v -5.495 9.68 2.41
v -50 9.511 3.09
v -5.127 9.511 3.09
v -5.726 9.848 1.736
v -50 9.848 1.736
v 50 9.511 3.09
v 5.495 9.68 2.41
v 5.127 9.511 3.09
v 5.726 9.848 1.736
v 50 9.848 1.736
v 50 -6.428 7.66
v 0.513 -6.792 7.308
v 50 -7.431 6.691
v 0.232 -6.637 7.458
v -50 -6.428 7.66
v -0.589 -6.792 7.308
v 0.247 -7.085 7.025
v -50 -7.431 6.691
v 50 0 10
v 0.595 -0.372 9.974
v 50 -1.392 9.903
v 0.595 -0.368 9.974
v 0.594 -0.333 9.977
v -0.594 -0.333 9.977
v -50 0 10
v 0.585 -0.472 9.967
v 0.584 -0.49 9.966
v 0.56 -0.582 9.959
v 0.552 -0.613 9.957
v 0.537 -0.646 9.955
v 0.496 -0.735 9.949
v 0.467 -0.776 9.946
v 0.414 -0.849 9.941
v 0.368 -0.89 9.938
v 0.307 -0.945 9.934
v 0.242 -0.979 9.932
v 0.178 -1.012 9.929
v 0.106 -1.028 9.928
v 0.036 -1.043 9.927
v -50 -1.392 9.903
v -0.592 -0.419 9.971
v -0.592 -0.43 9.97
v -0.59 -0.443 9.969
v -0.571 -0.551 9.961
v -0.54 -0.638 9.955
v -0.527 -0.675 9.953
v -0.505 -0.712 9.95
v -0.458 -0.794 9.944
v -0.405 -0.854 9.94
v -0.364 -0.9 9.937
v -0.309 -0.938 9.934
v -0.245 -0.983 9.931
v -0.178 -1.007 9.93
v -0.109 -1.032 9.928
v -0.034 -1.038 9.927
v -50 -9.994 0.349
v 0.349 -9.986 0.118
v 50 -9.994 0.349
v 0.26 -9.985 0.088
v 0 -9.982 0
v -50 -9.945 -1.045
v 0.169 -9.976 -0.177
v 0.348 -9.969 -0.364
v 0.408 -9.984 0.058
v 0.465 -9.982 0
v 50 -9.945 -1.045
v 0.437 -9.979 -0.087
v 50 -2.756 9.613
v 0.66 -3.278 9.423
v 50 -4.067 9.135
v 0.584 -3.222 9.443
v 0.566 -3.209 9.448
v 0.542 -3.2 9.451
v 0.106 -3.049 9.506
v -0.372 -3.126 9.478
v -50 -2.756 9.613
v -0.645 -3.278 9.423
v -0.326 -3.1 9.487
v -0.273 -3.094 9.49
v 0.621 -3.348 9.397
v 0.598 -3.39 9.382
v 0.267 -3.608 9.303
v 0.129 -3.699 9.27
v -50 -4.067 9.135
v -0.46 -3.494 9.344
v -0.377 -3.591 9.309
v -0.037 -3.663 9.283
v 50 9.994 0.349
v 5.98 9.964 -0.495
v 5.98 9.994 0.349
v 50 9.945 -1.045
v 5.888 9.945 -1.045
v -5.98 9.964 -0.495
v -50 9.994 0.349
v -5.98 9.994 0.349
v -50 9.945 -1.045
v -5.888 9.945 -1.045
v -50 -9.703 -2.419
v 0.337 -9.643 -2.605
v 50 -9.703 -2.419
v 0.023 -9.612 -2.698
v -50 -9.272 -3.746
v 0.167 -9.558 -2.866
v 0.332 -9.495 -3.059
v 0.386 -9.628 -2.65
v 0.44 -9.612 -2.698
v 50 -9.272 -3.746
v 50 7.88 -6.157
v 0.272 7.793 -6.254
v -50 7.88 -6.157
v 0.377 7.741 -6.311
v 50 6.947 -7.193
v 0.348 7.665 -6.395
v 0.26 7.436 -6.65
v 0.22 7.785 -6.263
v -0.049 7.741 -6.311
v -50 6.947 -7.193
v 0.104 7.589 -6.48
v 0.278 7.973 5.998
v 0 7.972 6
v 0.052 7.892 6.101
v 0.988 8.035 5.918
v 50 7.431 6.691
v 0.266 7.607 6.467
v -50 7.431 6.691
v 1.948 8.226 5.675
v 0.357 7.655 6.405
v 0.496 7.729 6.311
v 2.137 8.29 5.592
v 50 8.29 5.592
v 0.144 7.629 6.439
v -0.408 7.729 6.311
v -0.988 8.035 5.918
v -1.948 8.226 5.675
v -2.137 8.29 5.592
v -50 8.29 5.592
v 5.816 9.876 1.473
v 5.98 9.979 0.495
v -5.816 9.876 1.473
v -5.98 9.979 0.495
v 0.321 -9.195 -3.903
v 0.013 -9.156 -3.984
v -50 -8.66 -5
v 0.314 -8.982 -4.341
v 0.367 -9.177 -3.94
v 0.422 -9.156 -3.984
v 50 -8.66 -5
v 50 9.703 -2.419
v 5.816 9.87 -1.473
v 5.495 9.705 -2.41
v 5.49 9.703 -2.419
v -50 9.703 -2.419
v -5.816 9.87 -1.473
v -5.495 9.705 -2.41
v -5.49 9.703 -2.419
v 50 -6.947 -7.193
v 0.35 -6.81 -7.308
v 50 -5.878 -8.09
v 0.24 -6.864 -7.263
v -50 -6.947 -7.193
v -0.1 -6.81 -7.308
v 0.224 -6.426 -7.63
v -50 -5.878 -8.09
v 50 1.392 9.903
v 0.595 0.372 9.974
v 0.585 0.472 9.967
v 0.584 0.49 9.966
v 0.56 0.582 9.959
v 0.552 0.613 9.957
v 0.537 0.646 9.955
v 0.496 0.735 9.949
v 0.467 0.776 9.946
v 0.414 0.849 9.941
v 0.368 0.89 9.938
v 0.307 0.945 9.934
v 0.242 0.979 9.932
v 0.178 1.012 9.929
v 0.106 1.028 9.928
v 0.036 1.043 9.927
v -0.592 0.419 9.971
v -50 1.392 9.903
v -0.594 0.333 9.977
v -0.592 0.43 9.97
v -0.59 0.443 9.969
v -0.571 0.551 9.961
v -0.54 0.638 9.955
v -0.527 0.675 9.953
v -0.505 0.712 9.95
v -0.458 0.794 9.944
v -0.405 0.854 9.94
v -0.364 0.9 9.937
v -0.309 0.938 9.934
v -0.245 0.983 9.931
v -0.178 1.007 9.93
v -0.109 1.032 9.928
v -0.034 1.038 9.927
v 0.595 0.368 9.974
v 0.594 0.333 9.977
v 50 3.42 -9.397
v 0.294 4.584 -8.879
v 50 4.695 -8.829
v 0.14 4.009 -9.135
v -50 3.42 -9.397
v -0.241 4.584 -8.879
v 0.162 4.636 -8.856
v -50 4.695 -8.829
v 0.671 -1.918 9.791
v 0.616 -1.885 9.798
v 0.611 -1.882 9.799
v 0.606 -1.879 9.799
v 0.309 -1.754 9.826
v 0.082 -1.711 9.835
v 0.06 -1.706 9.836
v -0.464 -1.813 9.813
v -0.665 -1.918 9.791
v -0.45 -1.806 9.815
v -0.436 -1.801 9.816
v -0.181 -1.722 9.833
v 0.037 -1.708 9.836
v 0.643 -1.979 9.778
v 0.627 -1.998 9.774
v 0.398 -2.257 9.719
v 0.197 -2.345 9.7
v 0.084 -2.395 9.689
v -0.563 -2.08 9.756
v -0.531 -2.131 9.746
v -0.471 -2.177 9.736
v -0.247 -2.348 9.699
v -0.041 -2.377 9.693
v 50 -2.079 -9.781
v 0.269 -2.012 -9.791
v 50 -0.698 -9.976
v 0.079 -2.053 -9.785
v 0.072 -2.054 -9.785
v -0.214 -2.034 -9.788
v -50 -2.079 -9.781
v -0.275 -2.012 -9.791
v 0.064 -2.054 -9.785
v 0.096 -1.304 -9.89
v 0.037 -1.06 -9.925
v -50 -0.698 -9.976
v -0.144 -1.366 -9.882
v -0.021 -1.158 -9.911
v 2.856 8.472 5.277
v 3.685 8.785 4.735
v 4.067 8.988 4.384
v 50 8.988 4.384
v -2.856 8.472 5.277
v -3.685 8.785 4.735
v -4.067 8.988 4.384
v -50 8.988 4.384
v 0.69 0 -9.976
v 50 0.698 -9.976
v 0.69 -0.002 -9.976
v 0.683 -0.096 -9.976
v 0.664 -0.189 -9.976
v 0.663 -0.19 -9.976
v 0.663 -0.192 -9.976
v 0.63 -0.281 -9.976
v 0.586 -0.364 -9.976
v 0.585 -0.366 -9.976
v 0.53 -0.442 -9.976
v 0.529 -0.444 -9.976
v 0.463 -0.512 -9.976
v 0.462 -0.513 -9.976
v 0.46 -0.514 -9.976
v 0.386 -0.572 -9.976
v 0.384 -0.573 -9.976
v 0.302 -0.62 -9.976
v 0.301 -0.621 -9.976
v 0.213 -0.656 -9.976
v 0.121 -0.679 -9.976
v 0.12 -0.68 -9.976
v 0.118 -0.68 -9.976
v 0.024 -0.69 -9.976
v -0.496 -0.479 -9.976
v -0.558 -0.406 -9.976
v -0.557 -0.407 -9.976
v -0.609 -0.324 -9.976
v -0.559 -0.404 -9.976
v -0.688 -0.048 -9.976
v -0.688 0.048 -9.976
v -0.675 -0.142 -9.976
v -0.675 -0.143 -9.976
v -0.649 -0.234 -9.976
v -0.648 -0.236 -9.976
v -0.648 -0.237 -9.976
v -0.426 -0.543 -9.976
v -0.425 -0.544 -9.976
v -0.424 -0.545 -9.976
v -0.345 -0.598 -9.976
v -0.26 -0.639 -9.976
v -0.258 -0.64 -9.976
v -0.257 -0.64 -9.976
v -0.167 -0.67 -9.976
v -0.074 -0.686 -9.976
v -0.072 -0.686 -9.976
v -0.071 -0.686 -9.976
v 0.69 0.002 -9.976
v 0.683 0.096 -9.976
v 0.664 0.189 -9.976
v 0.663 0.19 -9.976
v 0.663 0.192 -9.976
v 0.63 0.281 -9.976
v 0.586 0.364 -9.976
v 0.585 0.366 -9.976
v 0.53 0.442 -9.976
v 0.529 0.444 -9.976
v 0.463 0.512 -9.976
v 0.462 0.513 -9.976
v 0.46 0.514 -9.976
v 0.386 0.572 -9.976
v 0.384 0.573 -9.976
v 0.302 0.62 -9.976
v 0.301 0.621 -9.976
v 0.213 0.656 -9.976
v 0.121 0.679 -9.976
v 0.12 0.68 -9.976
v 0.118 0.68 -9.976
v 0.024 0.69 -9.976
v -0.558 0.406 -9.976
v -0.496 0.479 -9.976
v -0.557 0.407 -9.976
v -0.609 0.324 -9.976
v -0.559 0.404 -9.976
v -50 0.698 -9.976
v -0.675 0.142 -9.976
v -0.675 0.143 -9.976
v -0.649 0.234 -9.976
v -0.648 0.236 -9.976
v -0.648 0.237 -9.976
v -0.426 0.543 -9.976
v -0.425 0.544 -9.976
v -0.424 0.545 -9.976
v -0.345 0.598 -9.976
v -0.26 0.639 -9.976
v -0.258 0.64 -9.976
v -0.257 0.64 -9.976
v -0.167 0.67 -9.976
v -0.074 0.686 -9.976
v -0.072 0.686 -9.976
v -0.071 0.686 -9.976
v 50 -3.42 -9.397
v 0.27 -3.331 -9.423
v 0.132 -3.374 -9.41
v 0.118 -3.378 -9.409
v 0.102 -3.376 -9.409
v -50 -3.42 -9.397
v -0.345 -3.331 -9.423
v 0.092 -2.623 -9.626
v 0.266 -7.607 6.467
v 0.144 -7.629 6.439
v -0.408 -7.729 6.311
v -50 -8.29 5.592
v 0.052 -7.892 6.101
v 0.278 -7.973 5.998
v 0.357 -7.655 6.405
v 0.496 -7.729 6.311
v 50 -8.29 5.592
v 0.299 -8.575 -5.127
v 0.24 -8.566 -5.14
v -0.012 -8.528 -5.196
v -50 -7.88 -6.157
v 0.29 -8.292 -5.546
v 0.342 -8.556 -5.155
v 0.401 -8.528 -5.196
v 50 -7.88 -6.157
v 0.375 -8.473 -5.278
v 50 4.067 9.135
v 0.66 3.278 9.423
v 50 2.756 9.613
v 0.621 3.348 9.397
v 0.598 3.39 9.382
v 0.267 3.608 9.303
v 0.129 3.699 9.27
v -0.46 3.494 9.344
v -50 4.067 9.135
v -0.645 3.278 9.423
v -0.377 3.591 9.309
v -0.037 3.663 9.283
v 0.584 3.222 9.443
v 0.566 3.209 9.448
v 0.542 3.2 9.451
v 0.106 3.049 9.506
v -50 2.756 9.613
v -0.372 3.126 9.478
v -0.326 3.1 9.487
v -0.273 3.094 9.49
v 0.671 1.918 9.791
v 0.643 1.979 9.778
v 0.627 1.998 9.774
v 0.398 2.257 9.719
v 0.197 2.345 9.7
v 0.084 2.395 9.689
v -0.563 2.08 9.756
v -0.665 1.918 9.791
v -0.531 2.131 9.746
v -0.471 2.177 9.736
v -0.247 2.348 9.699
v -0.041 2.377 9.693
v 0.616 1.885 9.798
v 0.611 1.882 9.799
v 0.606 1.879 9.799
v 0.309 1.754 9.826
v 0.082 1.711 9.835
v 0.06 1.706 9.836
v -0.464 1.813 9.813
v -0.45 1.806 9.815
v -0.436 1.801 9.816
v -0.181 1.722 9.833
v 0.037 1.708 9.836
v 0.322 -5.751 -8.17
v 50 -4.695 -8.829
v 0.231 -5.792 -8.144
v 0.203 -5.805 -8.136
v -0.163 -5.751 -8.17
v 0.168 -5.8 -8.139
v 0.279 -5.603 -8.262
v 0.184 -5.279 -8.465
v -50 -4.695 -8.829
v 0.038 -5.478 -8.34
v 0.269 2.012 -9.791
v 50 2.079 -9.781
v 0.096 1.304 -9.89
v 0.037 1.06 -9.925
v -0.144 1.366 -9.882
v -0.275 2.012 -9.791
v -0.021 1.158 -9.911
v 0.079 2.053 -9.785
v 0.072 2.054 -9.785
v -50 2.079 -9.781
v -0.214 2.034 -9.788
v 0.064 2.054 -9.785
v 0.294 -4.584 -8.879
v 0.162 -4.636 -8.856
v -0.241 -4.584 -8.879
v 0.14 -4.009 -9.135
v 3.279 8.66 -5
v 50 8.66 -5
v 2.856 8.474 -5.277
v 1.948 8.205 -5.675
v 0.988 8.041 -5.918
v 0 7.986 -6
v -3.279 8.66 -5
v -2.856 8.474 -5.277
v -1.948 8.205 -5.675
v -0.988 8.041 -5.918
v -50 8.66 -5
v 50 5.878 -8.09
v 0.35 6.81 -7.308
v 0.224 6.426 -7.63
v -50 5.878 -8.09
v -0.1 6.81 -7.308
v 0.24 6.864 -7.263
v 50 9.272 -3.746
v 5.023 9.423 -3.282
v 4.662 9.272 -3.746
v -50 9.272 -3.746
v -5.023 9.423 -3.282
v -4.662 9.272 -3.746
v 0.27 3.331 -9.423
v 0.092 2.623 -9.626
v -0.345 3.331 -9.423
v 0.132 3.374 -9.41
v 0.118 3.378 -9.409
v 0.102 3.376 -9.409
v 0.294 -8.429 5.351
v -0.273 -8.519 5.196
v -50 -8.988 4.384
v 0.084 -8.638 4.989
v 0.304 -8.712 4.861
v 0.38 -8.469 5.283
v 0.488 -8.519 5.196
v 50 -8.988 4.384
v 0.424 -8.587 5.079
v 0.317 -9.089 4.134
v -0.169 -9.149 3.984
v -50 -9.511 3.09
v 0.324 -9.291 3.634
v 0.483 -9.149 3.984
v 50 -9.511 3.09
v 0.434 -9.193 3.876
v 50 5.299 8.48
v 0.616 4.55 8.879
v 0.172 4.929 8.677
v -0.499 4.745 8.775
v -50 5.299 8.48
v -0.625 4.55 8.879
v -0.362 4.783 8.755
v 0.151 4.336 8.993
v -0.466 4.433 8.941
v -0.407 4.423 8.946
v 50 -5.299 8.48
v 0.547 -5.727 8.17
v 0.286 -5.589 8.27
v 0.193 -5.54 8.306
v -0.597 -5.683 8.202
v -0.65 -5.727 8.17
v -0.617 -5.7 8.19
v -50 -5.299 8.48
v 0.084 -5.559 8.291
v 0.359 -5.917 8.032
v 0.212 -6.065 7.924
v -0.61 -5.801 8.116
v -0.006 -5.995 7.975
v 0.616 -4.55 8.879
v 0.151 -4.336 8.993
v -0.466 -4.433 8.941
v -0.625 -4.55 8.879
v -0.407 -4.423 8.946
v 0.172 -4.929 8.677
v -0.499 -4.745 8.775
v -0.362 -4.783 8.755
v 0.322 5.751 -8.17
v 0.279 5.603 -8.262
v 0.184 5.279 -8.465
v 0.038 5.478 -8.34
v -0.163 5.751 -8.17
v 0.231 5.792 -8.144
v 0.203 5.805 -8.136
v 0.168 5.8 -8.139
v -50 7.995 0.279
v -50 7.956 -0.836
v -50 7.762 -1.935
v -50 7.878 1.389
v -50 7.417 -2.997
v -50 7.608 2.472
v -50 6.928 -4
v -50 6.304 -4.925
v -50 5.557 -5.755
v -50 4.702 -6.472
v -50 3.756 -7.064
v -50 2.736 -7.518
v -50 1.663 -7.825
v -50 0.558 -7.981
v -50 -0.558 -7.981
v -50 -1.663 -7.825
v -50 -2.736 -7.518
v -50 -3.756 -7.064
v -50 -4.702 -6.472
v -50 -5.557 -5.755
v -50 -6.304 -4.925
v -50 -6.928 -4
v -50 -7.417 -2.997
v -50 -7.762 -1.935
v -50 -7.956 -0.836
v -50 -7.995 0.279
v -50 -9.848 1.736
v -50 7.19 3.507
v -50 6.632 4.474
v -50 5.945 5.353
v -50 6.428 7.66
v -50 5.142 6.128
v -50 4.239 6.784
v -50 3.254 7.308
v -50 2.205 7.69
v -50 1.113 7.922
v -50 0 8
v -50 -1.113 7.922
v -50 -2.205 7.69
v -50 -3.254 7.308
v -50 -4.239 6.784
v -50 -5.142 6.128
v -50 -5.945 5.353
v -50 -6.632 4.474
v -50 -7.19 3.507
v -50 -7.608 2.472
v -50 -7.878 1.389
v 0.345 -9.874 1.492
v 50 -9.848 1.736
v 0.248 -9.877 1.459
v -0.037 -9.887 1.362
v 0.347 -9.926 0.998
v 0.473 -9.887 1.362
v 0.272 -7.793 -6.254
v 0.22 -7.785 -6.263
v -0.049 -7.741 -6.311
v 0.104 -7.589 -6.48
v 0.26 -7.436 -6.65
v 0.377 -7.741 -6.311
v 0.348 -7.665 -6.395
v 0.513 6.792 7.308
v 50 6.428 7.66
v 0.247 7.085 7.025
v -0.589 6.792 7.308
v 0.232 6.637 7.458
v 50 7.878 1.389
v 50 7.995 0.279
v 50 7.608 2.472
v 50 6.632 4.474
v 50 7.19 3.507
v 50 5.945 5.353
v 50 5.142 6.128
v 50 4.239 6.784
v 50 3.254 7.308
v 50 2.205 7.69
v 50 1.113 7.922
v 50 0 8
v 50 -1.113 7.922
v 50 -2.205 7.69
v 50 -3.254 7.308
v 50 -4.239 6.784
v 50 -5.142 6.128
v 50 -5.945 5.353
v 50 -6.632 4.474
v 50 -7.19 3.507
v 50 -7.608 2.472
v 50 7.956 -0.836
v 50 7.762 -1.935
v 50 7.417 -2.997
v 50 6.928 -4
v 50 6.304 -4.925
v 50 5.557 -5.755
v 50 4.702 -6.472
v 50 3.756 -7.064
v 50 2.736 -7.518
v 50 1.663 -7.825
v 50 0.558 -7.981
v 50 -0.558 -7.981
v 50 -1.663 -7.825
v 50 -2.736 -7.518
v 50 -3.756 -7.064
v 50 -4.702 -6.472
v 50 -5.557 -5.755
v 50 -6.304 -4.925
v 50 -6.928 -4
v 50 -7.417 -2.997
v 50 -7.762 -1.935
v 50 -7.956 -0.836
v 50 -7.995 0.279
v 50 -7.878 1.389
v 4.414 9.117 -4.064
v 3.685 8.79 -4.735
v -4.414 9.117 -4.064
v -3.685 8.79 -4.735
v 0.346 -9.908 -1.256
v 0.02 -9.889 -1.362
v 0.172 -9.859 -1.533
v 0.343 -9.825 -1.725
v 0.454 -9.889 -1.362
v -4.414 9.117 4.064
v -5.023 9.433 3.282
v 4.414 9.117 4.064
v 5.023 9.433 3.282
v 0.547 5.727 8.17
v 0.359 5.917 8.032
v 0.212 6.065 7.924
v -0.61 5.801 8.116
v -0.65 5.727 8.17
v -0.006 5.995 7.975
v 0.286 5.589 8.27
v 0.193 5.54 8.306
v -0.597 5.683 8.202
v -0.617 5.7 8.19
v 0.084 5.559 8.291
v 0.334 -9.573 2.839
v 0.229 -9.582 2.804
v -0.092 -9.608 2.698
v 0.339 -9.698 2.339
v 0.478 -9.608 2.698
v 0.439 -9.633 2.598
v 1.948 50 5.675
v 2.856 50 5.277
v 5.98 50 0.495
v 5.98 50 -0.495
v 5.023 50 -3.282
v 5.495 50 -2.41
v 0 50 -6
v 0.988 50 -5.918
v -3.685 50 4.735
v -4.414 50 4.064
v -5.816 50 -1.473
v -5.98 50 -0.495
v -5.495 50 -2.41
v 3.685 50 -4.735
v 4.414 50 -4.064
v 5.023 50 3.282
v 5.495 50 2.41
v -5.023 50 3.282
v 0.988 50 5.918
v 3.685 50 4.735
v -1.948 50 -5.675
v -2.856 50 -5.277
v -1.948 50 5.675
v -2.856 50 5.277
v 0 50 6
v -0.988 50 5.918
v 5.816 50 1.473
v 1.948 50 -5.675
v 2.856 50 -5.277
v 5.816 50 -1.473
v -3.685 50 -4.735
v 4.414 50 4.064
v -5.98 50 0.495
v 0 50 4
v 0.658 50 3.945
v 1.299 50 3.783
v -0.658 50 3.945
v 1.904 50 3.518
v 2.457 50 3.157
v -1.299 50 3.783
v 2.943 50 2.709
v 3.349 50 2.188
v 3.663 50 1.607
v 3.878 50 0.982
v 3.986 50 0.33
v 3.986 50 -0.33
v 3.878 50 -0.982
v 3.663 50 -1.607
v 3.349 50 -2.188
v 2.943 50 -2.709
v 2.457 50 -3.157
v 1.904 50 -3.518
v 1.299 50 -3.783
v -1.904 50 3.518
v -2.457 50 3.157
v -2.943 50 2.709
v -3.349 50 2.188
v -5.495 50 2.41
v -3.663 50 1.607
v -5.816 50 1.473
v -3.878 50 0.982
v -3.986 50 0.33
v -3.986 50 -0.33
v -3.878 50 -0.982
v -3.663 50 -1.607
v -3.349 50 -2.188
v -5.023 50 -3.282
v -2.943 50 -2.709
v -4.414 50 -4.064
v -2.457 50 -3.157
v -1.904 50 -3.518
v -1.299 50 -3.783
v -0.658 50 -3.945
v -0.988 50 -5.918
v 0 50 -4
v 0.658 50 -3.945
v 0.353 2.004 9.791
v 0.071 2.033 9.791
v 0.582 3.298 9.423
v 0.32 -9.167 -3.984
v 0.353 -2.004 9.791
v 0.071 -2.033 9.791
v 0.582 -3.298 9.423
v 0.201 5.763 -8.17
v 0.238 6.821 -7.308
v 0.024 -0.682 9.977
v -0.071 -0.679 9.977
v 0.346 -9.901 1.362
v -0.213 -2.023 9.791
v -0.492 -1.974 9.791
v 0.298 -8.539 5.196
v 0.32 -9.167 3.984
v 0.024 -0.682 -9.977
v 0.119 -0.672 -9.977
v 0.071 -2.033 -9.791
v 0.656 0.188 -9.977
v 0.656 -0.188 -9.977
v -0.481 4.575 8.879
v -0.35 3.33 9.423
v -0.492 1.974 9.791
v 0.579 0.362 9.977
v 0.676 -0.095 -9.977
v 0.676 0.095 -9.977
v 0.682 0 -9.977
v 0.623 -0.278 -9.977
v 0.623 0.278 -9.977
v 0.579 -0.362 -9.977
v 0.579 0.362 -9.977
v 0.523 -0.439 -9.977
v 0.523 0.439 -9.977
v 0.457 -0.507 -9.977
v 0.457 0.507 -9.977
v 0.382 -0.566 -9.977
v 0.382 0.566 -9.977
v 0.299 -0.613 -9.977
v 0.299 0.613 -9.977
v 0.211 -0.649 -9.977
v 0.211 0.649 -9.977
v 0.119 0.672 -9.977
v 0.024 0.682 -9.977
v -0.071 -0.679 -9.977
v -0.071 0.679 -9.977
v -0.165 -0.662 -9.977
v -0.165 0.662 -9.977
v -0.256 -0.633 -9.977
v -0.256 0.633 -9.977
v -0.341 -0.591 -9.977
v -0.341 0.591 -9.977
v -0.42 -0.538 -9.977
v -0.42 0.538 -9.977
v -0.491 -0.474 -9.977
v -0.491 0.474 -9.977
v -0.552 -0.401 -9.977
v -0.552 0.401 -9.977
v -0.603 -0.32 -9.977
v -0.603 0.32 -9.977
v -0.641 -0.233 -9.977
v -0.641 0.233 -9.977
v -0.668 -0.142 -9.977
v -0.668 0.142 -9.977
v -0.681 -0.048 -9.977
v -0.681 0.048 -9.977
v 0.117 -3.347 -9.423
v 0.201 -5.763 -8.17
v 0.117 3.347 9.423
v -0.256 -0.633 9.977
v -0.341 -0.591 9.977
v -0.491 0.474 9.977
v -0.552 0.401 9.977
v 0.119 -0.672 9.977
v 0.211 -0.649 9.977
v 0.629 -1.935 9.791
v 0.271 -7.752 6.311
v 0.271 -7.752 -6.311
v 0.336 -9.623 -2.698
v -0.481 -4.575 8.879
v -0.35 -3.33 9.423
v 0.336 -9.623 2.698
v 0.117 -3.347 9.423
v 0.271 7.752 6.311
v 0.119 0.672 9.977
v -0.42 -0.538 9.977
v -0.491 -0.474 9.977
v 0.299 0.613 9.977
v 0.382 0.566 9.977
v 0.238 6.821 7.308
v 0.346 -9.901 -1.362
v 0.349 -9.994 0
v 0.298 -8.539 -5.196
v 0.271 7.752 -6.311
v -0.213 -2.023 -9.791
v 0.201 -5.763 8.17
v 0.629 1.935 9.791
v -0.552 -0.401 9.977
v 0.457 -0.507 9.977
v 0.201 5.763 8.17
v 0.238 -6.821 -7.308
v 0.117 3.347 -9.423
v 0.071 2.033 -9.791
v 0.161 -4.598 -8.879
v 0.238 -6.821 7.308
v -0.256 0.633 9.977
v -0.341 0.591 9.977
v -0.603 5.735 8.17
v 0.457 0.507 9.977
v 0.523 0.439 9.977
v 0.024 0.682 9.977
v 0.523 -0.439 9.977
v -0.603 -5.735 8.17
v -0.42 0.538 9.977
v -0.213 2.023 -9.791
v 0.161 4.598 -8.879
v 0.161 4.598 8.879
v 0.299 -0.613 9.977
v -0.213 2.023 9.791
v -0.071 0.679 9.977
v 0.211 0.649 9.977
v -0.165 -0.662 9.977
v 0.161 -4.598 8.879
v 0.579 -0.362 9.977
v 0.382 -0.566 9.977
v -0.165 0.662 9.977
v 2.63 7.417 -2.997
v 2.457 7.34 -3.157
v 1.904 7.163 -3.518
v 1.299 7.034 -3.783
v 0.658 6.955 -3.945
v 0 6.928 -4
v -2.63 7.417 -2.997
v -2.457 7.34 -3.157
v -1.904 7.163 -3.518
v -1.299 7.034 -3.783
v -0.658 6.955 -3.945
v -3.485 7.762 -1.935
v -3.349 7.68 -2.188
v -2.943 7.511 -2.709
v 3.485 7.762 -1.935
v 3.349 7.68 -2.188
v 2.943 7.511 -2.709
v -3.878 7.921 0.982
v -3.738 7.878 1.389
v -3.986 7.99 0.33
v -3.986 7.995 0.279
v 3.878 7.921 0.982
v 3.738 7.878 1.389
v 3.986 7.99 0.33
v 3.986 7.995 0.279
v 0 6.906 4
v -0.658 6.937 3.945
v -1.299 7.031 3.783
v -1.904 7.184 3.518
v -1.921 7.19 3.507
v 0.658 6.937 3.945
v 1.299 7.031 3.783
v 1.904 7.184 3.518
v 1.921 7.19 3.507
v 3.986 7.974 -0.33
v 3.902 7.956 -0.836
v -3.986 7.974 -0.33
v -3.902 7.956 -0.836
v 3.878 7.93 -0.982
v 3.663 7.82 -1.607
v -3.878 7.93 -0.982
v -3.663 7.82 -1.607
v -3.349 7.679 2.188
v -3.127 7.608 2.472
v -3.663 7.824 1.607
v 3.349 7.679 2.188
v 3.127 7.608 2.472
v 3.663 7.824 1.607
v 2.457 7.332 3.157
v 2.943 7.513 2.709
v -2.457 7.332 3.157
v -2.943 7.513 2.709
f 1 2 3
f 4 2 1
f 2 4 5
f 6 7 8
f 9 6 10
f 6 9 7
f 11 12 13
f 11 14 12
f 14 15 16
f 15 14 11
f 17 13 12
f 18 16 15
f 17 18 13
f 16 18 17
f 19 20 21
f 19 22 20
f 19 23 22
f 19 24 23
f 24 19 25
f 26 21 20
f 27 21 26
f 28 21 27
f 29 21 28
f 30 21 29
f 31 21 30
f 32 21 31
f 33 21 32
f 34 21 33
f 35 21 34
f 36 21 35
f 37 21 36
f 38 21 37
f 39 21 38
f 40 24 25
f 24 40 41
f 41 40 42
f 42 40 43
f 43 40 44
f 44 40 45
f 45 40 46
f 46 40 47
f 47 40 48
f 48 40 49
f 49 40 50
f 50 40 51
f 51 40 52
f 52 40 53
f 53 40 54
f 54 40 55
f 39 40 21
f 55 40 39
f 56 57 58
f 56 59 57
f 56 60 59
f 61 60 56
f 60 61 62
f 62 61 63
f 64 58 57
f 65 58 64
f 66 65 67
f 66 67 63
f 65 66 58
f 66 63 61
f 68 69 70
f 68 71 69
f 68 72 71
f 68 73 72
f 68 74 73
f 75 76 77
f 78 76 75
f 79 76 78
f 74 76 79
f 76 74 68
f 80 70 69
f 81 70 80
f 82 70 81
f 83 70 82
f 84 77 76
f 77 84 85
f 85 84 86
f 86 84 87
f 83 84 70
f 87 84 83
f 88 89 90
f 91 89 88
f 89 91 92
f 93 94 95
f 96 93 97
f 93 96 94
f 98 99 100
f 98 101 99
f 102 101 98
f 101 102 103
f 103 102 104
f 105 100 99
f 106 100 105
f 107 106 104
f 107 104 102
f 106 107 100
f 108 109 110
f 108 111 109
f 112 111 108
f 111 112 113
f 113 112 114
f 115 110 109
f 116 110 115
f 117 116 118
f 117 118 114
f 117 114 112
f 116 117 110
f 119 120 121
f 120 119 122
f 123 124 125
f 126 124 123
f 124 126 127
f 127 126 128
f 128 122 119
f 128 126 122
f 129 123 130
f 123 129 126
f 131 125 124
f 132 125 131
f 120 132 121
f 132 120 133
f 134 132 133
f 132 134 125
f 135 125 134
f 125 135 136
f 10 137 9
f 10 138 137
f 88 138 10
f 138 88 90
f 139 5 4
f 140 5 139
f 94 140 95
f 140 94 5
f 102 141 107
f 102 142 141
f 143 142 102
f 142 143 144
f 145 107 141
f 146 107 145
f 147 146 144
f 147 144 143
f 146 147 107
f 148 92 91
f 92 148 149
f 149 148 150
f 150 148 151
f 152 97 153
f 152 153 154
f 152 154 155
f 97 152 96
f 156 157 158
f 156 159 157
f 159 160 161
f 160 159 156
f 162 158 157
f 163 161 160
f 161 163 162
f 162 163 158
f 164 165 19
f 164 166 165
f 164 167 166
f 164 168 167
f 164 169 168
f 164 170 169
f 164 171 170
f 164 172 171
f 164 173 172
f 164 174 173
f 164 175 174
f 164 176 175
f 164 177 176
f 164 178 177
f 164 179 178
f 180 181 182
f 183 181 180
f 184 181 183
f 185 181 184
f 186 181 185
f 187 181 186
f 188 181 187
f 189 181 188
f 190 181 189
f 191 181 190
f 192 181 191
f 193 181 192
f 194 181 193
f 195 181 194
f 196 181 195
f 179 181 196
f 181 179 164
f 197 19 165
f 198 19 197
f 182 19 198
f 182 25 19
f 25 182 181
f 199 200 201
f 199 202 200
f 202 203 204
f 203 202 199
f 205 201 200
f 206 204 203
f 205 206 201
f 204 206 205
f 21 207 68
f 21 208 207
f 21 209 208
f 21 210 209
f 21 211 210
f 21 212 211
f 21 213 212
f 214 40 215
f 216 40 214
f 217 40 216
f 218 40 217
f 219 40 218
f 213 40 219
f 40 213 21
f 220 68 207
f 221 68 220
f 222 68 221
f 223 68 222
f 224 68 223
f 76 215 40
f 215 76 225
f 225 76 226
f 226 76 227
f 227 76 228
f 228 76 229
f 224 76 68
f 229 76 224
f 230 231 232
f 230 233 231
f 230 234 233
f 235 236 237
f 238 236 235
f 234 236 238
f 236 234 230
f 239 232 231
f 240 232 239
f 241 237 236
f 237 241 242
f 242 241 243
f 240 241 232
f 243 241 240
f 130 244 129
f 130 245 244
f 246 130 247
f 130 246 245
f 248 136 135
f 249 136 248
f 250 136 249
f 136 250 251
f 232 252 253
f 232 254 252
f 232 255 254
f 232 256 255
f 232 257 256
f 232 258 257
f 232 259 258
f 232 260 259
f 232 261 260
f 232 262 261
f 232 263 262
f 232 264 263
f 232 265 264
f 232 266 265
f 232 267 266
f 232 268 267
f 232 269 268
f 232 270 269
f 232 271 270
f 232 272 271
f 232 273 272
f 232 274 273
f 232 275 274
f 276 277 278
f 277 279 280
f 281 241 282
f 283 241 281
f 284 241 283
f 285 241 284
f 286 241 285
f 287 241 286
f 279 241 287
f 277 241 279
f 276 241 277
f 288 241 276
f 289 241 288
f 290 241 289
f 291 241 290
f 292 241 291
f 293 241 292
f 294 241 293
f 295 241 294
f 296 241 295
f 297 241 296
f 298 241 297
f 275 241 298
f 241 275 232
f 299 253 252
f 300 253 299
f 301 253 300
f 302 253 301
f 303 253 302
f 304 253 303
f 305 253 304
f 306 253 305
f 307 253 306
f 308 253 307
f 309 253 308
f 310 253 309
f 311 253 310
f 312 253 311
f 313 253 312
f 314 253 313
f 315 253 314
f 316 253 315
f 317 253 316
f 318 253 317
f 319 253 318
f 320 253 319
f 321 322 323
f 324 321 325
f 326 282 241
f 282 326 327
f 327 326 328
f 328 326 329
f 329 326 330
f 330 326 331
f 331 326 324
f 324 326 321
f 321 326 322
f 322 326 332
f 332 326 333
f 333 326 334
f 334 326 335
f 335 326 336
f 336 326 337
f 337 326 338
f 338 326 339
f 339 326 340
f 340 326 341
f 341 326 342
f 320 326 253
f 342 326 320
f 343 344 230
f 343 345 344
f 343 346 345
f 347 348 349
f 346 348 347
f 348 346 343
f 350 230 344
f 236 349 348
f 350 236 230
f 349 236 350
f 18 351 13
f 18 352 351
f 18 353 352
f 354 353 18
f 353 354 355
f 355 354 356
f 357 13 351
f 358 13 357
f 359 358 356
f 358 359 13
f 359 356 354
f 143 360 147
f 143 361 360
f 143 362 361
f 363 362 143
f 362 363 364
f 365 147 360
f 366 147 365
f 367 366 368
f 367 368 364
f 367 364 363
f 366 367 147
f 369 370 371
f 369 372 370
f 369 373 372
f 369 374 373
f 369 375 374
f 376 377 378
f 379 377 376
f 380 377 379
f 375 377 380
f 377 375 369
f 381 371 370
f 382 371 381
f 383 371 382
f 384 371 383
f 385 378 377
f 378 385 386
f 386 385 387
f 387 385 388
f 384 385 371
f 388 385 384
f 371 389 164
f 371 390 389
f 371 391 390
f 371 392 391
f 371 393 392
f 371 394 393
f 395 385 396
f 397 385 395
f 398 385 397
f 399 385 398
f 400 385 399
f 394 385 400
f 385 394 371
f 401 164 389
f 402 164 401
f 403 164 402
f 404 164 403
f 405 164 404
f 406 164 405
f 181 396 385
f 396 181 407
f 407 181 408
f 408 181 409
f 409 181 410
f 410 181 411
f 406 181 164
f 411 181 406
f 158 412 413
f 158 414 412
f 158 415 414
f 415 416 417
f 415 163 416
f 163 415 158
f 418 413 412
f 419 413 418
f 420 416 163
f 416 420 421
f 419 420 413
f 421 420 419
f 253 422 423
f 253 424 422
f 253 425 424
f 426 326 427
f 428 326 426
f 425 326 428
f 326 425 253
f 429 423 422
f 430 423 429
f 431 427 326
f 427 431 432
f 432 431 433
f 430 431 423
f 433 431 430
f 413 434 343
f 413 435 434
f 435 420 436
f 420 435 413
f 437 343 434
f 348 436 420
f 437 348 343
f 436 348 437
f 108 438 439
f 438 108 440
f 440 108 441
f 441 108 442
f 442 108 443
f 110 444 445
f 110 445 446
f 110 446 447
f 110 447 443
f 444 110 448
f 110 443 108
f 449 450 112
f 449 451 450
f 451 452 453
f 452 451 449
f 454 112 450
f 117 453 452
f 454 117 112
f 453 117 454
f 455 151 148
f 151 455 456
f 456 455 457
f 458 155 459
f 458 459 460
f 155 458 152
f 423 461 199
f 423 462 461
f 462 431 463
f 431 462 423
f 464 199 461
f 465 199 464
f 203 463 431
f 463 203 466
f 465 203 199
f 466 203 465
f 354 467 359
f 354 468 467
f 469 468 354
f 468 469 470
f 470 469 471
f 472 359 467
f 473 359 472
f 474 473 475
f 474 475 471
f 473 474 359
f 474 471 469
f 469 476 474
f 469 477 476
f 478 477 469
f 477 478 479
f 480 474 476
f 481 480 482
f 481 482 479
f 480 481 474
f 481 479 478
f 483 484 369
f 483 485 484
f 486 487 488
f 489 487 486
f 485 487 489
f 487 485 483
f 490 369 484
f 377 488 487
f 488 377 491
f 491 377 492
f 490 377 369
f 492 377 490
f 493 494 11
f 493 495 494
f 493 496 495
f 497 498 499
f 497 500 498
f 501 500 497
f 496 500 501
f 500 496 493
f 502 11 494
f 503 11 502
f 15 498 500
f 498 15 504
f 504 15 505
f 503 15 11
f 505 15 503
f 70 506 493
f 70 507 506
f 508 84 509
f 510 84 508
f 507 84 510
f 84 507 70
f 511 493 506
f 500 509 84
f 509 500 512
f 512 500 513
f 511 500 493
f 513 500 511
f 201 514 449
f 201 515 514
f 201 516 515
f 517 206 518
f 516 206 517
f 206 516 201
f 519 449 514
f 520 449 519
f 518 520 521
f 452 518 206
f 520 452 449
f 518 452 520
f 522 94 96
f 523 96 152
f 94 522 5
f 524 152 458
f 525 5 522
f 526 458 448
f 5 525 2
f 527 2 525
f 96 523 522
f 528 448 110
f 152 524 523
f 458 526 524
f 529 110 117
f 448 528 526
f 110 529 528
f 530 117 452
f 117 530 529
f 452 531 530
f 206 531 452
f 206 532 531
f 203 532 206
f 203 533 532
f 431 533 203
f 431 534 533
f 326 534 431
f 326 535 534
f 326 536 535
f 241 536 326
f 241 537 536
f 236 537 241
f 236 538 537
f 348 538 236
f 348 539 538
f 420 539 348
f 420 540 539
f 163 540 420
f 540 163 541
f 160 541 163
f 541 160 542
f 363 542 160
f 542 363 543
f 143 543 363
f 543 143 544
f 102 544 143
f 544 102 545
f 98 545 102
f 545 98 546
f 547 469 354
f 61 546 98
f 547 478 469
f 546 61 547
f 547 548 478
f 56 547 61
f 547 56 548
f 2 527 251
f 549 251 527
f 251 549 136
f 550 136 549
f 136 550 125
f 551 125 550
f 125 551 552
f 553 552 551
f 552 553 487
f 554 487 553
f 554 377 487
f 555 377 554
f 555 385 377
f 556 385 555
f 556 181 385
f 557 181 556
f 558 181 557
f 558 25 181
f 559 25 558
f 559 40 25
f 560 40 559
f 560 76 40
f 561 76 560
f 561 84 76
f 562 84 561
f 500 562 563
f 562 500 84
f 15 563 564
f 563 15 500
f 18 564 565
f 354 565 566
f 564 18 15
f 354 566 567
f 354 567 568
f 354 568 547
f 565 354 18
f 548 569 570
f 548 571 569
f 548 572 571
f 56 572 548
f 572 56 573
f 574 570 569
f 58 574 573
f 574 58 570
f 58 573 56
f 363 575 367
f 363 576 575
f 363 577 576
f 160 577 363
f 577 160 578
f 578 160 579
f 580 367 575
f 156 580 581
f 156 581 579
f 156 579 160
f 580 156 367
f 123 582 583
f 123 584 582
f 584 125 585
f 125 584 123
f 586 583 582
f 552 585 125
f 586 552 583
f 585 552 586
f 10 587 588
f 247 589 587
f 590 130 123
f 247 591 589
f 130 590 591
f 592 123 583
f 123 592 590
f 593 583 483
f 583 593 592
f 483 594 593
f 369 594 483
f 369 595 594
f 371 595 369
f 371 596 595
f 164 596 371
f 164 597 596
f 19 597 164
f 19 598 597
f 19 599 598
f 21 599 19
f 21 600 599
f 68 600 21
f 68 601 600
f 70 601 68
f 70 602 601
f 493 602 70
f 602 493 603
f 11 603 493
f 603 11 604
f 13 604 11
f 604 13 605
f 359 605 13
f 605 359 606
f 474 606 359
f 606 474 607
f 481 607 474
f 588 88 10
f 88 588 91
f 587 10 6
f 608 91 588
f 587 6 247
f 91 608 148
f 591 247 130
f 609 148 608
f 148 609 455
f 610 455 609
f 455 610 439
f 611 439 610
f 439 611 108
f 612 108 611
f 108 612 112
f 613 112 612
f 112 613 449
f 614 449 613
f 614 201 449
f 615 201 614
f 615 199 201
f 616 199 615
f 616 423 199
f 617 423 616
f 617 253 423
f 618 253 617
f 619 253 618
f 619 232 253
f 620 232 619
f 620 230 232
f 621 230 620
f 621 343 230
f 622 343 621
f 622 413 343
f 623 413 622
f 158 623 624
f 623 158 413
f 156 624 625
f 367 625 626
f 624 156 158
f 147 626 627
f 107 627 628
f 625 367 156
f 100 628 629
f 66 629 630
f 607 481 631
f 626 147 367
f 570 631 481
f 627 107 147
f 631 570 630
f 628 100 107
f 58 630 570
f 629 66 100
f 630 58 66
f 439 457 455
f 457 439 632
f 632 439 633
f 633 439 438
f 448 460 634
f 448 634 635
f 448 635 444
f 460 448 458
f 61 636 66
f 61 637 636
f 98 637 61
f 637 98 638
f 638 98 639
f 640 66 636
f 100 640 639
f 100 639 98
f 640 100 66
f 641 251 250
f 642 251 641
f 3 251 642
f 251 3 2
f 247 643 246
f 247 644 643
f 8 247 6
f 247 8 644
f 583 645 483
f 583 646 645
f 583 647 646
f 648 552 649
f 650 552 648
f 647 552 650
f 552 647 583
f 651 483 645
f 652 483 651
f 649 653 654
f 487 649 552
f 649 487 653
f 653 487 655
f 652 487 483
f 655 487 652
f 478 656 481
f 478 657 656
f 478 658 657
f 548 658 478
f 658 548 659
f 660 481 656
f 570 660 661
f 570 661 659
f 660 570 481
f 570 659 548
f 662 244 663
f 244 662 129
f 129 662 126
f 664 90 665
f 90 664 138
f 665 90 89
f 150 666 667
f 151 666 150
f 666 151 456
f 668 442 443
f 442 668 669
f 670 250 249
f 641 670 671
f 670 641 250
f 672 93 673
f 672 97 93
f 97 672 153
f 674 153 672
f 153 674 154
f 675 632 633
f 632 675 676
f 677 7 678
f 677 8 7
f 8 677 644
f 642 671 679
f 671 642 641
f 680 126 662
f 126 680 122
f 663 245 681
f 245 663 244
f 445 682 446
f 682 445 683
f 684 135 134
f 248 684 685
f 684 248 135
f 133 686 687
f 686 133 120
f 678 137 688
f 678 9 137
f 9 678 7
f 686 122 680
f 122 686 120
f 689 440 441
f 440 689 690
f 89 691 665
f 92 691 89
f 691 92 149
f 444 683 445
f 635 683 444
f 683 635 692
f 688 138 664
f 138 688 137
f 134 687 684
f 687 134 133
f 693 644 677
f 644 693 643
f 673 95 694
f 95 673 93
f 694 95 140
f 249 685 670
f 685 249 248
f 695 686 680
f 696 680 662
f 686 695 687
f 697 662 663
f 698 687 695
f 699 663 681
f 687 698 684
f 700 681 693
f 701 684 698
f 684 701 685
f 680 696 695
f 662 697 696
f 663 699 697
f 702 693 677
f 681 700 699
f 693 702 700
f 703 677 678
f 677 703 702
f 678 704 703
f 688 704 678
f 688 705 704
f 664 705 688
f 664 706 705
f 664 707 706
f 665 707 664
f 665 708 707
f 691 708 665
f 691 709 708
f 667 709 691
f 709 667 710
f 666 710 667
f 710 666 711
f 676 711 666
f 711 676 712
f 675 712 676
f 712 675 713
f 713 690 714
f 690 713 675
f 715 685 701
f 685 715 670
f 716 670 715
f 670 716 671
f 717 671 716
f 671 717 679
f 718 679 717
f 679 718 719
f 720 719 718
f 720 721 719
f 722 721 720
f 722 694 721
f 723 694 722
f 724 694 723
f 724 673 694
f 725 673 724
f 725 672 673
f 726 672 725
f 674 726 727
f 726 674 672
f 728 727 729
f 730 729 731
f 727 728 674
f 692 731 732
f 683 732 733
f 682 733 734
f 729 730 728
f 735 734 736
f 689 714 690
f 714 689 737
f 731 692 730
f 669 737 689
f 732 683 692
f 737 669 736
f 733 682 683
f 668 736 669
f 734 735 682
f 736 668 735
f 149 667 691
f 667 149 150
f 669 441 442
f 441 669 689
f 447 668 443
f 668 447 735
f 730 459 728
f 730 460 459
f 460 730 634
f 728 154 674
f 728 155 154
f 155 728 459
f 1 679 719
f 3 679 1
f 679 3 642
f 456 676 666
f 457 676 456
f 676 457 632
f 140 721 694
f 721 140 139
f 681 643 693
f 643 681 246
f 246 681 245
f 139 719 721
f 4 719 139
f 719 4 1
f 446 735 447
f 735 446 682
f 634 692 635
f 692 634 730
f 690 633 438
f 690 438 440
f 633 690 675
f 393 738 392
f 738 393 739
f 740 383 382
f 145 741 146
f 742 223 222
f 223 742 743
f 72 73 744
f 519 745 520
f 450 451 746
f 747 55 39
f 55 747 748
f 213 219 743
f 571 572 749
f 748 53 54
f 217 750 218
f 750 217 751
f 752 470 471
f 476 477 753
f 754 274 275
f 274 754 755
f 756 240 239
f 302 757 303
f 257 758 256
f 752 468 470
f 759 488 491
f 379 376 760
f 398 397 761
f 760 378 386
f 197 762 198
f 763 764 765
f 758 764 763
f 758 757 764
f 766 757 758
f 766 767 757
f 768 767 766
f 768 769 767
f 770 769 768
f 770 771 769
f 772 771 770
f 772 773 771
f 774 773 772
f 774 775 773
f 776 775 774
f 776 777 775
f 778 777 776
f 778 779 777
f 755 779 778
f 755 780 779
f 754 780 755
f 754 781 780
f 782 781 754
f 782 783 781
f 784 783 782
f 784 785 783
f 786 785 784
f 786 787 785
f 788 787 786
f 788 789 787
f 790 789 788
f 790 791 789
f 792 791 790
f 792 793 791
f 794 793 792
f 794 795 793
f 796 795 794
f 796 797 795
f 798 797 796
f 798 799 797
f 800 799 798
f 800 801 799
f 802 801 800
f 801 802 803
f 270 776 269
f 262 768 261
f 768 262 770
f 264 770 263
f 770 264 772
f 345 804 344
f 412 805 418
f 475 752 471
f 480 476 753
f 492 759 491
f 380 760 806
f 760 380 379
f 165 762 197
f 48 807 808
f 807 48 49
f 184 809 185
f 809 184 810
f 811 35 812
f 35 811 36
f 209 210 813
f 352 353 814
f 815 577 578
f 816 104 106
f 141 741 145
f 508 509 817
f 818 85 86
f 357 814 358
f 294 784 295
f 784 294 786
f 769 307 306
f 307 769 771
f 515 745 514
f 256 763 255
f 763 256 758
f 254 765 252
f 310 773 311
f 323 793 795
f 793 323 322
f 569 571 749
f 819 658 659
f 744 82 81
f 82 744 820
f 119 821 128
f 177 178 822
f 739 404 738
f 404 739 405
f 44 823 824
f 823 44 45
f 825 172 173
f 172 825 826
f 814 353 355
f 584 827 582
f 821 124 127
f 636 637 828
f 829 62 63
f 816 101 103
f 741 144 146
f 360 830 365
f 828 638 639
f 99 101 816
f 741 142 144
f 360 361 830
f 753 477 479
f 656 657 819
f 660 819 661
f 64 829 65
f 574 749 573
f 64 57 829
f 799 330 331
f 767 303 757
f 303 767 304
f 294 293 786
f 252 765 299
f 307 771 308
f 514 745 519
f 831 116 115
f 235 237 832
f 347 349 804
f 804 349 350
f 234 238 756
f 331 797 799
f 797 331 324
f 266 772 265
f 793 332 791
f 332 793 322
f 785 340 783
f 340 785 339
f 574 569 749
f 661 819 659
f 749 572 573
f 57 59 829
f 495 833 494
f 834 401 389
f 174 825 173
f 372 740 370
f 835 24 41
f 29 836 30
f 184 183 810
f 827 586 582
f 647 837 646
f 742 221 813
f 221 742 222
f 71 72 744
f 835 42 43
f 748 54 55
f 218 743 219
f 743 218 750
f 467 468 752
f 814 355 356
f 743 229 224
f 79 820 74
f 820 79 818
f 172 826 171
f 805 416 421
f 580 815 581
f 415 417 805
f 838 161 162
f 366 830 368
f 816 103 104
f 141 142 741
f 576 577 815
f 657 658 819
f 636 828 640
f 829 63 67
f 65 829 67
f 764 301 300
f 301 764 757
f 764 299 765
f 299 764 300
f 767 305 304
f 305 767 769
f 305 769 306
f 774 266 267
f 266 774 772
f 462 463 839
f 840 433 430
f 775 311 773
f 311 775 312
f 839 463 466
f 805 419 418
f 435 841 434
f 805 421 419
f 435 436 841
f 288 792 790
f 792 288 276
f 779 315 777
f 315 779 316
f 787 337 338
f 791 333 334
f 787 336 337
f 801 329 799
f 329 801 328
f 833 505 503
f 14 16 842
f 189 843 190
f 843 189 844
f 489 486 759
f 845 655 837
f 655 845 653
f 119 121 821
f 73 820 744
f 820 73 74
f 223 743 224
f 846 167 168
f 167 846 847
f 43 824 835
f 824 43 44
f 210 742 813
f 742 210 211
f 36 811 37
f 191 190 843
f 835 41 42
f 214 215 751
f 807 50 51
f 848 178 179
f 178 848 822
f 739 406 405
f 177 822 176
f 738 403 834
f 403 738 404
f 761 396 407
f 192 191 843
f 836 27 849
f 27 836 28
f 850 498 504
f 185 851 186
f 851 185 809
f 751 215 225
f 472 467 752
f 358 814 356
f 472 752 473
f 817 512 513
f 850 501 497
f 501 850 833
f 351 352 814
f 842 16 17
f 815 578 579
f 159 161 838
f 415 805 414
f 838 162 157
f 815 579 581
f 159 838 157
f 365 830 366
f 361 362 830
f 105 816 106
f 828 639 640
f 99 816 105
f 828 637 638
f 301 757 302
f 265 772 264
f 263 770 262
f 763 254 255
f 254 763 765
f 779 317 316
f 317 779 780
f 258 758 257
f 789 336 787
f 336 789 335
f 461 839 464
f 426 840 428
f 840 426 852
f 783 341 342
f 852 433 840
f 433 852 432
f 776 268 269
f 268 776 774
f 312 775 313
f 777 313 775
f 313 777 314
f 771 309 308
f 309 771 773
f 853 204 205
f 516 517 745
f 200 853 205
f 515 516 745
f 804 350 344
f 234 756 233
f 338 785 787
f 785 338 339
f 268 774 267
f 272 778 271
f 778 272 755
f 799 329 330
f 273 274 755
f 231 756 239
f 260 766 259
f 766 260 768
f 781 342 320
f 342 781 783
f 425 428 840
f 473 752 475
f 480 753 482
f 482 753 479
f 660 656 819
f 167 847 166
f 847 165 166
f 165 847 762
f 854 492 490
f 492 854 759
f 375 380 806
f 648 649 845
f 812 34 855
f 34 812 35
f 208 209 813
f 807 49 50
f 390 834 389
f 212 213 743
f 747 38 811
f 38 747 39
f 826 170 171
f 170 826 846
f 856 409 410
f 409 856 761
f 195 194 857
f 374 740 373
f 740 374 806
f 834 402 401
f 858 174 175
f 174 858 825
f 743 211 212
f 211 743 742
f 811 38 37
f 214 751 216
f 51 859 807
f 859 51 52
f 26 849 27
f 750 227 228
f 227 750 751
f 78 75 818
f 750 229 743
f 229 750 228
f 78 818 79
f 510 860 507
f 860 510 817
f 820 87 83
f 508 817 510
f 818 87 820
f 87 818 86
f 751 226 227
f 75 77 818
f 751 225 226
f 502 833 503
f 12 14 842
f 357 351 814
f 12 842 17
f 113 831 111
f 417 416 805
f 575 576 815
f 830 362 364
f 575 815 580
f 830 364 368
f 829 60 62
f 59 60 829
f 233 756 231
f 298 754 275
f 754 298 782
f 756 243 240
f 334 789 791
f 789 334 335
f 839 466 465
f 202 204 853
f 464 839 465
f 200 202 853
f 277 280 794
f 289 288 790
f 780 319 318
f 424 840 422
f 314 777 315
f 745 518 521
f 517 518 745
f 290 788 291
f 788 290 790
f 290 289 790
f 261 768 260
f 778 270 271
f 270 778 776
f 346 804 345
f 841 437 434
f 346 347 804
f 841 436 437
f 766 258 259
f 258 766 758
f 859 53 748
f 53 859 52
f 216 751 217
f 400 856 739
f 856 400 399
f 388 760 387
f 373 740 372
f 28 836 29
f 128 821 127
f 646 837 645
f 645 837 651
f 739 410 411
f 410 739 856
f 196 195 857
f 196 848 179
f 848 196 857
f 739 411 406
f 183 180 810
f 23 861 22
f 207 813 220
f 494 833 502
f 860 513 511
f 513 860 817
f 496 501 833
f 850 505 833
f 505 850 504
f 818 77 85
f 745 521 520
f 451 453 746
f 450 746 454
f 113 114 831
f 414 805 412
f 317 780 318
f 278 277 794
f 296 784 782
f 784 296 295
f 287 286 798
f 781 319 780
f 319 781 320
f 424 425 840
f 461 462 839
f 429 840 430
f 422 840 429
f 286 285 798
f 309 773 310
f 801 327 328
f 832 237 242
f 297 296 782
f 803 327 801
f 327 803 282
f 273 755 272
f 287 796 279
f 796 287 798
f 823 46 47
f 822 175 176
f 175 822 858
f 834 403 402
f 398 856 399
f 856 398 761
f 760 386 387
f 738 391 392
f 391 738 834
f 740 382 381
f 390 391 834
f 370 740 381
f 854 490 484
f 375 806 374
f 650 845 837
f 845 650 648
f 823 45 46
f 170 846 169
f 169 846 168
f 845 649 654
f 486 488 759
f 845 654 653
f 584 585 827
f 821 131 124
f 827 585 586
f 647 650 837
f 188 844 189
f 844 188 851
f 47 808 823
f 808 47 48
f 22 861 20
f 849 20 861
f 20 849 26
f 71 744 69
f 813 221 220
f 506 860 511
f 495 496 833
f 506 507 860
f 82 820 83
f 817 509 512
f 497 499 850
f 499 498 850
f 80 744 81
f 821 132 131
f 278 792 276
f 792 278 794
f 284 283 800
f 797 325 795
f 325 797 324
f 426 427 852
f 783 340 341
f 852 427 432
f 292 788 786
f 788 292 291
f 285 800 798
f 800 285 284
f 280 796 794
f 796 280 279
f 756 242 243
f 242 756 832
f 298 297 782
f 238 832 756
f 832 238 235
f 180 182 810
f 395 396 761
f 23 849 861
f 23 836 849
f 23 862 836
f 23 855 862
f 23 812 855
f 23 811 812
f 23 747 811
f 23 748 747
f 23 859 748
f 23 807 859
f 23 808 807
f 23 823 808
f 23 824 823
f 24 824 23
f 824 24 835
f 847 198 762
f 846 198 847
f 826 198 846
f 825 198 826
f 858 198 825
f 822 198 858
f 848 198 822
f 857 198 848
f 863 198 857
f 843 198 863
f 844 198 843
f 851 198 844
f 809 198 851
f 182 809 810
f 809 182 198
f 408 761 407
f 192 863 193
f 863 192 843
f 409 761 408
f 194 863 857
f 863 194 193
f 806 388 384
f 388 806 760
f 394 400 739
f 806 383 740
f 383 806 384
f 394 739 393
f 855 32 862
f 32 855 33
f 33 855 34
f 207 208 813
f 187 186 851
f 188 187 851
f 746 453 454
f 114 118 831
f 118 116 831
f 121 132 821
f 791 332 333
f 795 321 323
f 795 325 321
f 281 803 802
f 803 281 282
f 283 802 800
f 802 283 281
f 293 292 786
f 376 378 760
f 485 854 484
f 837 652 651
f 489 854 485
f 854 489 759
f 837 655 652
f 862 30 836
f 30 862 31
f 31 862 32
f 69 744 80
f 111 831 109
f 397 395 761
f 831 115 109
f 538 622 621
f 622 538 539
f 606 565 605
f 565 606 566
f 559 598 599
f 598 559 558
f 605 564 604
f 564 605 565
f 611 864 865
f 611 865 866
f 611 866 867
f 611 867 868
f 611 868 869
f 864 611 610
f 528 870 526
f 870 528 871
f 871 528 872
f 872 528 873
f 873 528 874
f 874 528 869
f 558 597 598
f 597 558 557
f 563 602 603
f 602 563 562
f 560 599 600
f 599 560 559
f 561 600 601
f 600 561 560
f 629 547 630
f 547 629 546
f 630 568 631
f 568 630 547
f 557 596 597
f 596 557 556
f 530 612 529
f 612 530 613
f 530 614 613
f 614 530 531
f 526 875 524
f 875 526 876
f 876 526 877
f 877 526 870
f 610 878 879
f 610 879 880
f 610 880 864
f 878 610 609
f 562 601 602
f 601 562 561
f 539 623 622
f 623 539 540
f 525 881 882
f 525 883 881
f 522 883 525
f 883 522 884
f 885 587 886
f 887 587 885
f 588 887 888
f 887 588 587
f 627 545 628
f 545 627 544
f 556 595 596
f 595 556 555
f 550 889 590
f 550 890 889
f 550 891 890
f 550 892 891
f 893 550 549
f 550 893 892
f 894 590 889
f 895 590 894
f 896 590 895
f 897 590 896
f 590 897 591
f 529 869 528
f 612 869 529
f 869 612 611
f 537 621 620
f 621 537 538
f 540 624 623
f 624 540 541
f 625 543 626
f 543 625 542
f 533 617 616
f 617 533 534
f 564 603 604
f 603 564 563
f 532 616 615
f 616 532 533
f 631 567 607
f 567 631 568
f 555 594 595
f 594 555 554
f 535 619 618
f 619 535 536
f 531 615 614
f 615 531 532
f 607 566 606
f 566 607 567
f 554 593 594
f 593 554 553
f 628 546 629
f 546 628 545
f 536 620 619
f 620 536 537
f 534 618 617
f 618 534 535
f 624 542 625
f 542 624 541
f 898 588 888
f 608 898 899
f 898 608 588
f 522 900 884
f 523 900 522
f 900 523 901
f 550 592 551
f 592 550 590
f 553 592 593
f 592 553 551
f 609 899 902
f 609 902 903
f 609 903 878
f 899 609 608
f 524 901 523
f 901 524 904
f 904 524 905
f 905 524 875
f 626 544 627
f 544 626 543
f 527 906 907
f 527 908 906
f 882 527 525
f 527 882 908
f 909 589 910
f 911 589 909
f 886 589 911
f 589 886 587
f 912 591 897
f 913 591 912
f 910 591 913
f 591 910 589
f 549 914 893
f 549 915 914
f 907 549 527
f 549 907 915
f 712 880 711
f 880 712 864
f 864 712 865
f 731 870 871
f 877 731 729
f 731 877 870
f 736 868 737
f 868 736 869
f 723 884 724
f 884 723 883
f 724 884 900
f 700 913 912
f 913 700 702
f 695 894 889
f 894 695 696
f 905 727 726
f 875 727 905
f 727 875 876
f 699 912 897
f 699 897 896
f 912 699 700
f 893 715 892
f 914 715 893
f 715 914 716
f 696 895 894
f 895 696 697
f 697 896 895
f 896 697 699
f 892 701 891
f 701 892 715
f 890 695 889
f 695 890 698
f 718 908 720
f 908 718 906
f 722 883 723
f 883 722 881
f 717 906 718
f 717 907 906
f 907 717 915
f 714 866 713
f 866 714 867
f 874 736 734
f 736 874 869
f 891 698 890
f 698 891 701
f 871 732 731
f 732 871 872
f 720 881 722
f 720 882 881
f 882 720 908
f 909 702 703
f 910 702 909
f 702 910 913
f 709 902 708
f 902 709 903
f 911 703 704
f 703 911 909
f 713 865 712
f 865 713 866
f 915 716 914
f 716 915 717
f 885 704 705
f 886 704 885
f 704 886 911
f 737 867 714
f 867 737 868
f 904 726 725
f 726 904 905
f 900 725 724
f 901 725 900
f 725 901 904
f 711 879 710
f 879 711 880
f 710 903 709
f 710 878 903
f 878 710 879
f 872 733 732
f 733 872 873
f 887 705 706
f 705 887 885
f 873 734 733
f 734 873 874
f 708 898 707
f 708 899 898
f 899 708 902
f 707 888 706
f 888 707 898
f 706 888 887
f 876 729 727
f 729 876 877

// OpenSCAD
// 10_tee_wall_landing — the junction case that breaks the naive construction.
//
// The branch starts on the trunk's outer WALL, not on its axis. That is how
// every real tee is described, and how reference/doommeister/'s own middle_tee_n
// is parameterised -- and in design review it produced a 0.95 mm PLUG across the
// branch lumen while CGAL reported `Simple: yes, Volumes: 2` and a naive
// manifoldness regression test PASSED.
//
// Two things fix it, and neither is a global epsilon:
//   * the joint is DECLARED, with a mid-run landing ["s", 50] on the trunk, so
//     the assembler knows the node is on the trunk CENTRELINE;
//   * both the shell AND the bore are extended from the branch end to that node.
//     Extending only the bore leaves the shells touching tangentially -- measured
//     `Simple: yes, Volumes: 3`, two solids sharing a circle.

// clang-format off
use <../src/uniTube.scad>;
// clang-format on

$fa = 8;
$fs = 1;

module part()
{
    trunk = ut_run("trunk", ut_polyline([ [ -50, 0, 0 ], [ 50, 0, 0 ] ]), ut_round(od = 20, wall = 2));
    // Starts at y = 10, exactly on the trunk's outer surface.
    branch = ut_run("branch", ut_polyline([ [ 0, 10, 0 ], [ 0, 50, 0 ] ]), ut_round(od = 12, wall = 2));

    ut_assemble(ut_net([ trunk, branch ], [ut_joint([ [ "trunk", [ "s", 50 ] ], [ "branch", "a" ] ])]));
}

part();
